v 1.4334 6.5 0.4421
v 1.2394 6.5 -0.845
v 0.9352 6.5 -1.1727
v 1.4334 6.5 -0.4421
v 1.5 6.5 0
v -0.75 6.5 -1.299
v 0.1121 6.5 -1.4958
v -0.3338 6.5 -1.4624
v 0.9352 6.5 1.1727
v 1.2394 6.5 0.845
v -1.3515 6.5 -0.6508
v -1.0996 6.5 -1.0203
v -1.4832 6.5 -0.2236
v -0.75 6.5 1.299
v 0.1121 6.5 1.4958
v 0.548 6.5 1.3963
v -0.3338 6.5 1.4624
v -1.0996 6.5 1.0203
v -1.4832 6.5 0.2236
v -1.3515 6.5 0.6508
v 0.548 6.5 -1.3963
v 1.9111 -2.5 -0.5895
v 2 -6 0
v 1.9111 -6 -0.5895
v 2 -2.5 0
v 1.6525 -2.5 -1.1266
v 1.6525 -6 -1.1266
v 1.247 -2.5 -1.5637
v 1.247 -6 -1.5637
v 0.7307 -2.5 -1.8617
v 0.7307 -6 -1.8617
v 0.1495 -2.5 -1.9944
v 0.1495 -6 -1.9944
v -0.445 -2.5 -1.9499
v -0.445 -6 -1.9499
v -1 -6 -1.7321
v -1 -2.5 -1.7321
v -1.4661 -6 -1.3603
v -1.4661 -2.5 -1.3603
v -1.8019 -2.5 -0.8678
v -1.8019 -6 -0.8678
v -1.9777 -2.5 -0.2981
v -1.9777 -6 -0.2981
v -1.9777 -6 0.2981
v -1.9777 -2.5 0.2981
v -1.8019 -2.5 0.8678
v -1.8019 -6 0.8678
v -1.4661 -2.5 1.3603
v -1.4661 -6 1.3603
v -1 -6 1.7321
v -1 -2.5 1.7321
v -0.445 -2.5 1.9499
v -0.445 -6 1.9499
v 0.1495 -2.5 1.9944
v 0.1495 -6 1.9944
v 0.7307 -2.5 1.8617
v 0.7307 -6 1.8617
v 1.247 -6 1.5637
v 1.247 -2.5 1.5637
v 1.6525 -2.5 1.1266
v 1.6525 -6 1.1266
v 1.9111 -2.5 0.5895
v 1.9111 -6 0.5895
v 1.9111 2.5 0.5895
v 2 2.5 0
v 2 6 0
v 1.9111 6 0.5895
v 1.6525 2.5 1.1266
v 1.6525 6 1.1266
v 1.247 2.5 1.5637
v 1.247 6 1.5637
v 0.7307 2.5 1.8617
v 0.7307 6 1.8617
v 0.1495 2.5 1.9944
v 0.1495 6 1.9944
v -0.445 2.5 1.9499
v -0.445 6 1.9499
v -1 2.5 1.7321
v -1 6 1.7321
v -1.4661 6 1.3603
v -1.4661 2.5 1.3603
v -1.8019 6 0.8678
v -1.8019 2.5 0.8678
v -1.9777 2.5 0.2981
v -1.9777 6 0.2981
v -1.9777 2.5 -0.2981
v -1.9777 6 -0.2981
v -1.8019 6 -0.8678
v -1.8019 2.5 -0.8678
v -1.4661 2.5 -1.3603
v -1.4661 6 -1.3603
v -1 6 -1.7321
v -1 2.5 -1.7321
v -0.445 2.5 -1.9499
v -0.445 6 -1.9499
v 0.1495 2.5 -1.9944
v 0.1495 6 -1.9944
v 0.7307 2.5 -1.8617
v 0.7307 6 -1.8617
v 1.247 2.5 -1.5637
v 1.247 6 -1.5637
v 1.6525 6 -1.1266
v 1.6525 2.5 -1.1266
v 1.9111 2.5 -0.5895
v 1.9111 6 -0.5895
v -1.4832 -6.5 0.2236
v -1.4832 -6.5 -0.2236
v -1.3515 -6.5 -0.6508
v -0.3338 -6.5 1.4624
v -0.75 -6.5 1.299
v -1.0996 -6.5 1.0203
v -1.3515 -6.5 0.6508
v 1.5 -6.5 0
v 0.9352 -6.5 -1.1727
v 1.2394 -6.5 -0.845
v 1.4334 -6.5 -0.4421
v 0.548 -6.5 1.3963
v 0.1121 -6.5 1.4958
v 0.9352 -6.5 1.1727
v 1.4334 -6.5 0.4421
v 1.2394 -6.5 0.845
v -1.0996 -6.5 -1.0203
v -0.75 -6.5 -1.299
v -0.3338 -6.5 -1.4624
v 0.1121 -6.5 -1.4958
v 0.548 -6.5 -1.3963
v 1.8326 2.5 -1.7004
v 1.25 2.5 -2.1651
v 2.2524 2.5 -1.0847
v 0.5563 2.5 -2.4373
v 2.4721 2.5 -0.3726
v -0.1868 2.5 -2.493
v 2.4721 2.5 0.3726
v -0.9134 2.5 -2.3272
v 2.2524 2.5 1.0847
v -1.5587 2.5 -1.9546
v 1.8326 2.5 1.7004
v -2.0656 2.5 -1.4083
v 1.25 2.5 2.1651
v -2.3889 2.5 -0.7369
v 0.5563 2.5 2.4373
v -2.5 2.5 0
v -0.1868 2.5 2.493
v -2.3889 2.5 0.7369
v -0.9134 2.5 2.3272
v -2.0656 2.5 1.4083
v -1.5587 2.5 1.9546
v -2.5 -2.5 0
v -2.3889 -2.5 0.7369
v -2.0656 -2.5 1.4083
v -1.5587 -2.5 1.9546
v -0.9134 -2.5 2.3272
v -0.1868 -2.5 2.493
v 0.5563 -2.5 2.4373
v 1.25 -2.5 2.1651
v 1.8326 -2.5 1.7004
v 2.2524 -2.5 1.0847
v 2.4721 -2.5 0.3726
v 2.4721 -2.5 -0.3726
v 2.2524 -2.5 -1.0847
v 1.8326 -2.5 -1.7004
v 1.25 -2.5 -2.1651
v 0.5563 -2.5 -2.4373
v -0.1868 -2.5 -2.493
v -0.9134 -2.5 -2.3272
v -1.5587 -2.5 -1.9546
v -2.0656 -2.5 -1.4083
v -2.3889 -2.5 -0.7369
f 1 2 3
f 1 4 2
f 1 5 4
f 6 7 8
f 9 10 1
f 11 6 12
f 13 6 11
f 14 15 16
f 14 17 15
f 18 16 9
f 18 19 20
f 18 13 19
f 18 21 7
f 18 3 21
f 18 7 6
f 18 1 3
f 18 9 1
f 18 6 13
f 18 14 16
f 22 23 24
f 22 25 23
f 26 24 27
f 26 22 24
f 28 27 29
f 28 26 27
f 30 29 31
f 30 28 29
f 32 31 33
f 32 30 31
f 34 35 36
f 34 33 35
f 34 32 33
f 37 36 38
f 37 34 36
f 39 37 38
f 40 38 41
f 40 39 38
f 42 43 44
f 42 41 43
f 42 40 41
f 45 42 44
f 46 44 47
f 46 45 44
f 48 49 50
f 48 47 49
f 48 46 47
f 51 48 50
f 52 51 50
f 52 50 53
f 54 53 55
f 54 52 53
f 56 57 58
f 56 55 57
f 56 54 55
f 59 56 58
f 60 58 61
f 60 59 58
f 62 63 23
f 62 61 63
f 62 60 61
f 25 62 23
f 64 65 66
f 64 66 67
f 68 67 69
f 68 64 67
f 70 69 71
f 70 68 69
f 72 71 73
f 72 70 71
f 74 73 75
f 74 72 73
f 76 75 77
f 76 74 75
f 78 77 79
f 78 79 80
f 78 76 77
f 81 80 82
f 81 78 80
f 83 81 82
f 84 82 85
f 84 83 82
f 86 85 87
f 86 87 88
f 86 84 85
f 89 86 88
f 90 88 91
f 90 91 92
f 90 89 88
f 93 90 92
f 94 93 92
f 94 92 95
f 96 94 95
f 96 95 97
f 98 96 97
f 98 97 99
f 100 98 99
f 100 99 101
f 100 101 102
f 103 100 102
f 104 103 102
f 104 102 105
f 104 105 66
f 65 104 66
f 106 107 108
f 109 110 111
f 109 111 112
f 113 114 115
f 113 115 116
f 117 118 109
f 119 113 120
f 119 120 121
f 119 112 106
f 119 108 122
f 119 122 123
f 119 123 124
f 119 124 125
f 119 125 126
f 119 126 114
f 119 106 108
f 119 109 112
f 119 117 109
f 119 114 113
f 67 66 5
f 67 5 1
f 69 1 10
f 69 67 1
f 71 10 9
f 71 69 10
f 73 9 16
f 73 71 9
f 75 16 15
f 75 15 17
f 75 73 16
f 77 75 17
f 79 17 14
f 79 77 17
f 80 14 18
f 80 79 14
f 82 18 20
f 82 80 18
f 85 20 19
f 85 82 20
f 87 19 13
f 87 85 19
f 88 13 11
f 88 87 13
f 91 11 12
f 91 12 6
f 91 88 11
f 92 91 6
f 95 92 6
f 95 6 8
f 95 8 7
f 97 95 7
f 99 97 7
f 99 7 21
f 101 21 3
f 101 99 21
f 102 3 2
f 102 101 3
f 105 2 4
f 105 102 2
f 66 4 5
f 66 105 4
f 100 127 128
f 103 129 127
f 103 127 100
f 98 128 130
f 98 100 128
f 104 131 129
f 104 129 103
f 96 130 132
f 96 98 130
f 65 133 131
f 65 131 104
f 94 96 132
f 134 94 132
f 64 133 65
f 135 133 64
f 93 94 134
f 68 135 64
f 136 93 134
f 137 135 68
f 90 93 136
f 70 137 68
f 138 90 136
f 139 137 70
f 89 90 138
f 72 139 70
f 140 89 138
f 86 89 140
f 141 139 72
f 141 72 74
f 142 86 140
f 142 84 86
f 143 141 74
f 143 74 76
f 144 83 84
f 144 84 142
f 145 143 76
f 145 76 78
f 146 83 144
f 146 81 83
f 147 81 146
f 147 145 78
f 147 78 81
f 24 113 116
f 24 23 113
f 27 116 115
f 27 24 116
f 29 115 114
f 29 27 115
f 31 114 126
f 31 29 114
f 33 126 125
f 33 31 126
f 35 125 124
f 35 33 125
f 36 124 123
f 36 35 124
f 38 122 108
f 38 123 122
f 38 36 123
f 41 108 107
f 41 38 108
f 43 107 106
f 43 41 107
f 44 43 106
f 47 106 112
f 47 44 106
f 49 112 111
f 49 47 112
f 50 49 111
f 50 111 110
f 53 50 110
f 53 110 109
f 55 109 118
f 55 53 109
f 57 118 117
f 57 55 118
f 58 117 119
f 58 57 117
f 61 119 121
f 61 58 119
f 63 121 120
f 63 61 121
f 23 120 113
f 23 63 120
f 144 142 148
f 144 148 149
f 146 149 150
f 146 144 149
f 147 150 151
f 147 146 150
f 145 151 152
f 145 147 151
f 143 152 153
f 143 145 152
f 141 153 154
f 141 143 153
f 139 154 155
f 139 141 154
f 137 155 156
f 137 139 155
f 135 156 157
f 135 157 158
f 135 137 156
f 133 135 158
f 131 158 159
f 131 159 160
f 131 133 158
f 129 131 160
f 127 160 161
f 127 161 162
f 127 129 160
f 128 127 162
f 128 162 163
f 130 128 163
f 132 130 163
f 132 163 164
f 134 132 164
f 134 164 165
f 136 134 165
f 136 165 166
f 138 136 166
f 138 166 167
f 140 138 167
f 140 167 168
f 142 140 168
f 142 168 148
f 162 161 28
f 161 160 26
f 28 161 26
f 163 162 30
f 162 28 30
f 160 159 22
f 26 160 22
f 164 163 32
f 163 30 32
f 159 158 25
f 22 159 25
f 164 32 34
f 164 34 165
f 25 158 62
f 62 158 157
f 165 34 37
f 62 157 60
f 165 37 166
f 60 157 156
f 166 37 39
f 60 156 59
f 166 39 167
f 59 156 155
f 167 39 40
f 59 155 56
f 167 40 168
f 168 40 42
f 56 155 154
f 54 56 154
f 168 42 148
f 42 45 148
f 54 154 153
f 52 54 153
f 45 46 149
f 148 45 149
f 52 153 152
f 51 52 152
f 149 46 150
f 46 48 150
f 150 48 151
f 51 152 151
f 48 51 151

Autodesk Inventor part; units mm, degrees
ref_plane "YZ Plane" through (0, 0, 0) normal (1, 0, 0) x (0, 1, 0)
ref_plane "XZ Plane" through (0, 0, 0) normal (0, 1, 0) x (-1, 0, 0)
ref_plane "XY Plane" through (0, 0, 0) normal (0, 0, 1) x (1, 0, 0)
sketch "Esquisse1" plane through (0, 0, 0) normal (0, 1, 0) x (-1, 0, 0)
  circle A0 centre (0, 0) radius 2.5
  dimension "d0" = 5
extrude "Extrusion1" add sketch "Esquisse1" along normal mid plane 5
sketch "Esquisse2" plane through (0, -2.5, 0) normal (0, -1, 0) x (1, 0, 0)
  circle A0 centre (0, 0) radius 2
  dimension "d3" = 4
extrude "Extrusion2" add sketch "Esquisse2" along normal blind 4
thread "Filetage1" size "M4x0.7" class "6g" standard "ISO Metric profile" full length
chamfer "Chanfrein1" distance 0.5 angle 45 1 edges at (-2, -6.5, 0)
mirror "Symétrie1" about plane through (0, 0, 0) normal (0, 1, 0) of "Extrusion2", "Chanfrein1"
properties part number "tige_serrage_main" material "Aluminium 6061"
